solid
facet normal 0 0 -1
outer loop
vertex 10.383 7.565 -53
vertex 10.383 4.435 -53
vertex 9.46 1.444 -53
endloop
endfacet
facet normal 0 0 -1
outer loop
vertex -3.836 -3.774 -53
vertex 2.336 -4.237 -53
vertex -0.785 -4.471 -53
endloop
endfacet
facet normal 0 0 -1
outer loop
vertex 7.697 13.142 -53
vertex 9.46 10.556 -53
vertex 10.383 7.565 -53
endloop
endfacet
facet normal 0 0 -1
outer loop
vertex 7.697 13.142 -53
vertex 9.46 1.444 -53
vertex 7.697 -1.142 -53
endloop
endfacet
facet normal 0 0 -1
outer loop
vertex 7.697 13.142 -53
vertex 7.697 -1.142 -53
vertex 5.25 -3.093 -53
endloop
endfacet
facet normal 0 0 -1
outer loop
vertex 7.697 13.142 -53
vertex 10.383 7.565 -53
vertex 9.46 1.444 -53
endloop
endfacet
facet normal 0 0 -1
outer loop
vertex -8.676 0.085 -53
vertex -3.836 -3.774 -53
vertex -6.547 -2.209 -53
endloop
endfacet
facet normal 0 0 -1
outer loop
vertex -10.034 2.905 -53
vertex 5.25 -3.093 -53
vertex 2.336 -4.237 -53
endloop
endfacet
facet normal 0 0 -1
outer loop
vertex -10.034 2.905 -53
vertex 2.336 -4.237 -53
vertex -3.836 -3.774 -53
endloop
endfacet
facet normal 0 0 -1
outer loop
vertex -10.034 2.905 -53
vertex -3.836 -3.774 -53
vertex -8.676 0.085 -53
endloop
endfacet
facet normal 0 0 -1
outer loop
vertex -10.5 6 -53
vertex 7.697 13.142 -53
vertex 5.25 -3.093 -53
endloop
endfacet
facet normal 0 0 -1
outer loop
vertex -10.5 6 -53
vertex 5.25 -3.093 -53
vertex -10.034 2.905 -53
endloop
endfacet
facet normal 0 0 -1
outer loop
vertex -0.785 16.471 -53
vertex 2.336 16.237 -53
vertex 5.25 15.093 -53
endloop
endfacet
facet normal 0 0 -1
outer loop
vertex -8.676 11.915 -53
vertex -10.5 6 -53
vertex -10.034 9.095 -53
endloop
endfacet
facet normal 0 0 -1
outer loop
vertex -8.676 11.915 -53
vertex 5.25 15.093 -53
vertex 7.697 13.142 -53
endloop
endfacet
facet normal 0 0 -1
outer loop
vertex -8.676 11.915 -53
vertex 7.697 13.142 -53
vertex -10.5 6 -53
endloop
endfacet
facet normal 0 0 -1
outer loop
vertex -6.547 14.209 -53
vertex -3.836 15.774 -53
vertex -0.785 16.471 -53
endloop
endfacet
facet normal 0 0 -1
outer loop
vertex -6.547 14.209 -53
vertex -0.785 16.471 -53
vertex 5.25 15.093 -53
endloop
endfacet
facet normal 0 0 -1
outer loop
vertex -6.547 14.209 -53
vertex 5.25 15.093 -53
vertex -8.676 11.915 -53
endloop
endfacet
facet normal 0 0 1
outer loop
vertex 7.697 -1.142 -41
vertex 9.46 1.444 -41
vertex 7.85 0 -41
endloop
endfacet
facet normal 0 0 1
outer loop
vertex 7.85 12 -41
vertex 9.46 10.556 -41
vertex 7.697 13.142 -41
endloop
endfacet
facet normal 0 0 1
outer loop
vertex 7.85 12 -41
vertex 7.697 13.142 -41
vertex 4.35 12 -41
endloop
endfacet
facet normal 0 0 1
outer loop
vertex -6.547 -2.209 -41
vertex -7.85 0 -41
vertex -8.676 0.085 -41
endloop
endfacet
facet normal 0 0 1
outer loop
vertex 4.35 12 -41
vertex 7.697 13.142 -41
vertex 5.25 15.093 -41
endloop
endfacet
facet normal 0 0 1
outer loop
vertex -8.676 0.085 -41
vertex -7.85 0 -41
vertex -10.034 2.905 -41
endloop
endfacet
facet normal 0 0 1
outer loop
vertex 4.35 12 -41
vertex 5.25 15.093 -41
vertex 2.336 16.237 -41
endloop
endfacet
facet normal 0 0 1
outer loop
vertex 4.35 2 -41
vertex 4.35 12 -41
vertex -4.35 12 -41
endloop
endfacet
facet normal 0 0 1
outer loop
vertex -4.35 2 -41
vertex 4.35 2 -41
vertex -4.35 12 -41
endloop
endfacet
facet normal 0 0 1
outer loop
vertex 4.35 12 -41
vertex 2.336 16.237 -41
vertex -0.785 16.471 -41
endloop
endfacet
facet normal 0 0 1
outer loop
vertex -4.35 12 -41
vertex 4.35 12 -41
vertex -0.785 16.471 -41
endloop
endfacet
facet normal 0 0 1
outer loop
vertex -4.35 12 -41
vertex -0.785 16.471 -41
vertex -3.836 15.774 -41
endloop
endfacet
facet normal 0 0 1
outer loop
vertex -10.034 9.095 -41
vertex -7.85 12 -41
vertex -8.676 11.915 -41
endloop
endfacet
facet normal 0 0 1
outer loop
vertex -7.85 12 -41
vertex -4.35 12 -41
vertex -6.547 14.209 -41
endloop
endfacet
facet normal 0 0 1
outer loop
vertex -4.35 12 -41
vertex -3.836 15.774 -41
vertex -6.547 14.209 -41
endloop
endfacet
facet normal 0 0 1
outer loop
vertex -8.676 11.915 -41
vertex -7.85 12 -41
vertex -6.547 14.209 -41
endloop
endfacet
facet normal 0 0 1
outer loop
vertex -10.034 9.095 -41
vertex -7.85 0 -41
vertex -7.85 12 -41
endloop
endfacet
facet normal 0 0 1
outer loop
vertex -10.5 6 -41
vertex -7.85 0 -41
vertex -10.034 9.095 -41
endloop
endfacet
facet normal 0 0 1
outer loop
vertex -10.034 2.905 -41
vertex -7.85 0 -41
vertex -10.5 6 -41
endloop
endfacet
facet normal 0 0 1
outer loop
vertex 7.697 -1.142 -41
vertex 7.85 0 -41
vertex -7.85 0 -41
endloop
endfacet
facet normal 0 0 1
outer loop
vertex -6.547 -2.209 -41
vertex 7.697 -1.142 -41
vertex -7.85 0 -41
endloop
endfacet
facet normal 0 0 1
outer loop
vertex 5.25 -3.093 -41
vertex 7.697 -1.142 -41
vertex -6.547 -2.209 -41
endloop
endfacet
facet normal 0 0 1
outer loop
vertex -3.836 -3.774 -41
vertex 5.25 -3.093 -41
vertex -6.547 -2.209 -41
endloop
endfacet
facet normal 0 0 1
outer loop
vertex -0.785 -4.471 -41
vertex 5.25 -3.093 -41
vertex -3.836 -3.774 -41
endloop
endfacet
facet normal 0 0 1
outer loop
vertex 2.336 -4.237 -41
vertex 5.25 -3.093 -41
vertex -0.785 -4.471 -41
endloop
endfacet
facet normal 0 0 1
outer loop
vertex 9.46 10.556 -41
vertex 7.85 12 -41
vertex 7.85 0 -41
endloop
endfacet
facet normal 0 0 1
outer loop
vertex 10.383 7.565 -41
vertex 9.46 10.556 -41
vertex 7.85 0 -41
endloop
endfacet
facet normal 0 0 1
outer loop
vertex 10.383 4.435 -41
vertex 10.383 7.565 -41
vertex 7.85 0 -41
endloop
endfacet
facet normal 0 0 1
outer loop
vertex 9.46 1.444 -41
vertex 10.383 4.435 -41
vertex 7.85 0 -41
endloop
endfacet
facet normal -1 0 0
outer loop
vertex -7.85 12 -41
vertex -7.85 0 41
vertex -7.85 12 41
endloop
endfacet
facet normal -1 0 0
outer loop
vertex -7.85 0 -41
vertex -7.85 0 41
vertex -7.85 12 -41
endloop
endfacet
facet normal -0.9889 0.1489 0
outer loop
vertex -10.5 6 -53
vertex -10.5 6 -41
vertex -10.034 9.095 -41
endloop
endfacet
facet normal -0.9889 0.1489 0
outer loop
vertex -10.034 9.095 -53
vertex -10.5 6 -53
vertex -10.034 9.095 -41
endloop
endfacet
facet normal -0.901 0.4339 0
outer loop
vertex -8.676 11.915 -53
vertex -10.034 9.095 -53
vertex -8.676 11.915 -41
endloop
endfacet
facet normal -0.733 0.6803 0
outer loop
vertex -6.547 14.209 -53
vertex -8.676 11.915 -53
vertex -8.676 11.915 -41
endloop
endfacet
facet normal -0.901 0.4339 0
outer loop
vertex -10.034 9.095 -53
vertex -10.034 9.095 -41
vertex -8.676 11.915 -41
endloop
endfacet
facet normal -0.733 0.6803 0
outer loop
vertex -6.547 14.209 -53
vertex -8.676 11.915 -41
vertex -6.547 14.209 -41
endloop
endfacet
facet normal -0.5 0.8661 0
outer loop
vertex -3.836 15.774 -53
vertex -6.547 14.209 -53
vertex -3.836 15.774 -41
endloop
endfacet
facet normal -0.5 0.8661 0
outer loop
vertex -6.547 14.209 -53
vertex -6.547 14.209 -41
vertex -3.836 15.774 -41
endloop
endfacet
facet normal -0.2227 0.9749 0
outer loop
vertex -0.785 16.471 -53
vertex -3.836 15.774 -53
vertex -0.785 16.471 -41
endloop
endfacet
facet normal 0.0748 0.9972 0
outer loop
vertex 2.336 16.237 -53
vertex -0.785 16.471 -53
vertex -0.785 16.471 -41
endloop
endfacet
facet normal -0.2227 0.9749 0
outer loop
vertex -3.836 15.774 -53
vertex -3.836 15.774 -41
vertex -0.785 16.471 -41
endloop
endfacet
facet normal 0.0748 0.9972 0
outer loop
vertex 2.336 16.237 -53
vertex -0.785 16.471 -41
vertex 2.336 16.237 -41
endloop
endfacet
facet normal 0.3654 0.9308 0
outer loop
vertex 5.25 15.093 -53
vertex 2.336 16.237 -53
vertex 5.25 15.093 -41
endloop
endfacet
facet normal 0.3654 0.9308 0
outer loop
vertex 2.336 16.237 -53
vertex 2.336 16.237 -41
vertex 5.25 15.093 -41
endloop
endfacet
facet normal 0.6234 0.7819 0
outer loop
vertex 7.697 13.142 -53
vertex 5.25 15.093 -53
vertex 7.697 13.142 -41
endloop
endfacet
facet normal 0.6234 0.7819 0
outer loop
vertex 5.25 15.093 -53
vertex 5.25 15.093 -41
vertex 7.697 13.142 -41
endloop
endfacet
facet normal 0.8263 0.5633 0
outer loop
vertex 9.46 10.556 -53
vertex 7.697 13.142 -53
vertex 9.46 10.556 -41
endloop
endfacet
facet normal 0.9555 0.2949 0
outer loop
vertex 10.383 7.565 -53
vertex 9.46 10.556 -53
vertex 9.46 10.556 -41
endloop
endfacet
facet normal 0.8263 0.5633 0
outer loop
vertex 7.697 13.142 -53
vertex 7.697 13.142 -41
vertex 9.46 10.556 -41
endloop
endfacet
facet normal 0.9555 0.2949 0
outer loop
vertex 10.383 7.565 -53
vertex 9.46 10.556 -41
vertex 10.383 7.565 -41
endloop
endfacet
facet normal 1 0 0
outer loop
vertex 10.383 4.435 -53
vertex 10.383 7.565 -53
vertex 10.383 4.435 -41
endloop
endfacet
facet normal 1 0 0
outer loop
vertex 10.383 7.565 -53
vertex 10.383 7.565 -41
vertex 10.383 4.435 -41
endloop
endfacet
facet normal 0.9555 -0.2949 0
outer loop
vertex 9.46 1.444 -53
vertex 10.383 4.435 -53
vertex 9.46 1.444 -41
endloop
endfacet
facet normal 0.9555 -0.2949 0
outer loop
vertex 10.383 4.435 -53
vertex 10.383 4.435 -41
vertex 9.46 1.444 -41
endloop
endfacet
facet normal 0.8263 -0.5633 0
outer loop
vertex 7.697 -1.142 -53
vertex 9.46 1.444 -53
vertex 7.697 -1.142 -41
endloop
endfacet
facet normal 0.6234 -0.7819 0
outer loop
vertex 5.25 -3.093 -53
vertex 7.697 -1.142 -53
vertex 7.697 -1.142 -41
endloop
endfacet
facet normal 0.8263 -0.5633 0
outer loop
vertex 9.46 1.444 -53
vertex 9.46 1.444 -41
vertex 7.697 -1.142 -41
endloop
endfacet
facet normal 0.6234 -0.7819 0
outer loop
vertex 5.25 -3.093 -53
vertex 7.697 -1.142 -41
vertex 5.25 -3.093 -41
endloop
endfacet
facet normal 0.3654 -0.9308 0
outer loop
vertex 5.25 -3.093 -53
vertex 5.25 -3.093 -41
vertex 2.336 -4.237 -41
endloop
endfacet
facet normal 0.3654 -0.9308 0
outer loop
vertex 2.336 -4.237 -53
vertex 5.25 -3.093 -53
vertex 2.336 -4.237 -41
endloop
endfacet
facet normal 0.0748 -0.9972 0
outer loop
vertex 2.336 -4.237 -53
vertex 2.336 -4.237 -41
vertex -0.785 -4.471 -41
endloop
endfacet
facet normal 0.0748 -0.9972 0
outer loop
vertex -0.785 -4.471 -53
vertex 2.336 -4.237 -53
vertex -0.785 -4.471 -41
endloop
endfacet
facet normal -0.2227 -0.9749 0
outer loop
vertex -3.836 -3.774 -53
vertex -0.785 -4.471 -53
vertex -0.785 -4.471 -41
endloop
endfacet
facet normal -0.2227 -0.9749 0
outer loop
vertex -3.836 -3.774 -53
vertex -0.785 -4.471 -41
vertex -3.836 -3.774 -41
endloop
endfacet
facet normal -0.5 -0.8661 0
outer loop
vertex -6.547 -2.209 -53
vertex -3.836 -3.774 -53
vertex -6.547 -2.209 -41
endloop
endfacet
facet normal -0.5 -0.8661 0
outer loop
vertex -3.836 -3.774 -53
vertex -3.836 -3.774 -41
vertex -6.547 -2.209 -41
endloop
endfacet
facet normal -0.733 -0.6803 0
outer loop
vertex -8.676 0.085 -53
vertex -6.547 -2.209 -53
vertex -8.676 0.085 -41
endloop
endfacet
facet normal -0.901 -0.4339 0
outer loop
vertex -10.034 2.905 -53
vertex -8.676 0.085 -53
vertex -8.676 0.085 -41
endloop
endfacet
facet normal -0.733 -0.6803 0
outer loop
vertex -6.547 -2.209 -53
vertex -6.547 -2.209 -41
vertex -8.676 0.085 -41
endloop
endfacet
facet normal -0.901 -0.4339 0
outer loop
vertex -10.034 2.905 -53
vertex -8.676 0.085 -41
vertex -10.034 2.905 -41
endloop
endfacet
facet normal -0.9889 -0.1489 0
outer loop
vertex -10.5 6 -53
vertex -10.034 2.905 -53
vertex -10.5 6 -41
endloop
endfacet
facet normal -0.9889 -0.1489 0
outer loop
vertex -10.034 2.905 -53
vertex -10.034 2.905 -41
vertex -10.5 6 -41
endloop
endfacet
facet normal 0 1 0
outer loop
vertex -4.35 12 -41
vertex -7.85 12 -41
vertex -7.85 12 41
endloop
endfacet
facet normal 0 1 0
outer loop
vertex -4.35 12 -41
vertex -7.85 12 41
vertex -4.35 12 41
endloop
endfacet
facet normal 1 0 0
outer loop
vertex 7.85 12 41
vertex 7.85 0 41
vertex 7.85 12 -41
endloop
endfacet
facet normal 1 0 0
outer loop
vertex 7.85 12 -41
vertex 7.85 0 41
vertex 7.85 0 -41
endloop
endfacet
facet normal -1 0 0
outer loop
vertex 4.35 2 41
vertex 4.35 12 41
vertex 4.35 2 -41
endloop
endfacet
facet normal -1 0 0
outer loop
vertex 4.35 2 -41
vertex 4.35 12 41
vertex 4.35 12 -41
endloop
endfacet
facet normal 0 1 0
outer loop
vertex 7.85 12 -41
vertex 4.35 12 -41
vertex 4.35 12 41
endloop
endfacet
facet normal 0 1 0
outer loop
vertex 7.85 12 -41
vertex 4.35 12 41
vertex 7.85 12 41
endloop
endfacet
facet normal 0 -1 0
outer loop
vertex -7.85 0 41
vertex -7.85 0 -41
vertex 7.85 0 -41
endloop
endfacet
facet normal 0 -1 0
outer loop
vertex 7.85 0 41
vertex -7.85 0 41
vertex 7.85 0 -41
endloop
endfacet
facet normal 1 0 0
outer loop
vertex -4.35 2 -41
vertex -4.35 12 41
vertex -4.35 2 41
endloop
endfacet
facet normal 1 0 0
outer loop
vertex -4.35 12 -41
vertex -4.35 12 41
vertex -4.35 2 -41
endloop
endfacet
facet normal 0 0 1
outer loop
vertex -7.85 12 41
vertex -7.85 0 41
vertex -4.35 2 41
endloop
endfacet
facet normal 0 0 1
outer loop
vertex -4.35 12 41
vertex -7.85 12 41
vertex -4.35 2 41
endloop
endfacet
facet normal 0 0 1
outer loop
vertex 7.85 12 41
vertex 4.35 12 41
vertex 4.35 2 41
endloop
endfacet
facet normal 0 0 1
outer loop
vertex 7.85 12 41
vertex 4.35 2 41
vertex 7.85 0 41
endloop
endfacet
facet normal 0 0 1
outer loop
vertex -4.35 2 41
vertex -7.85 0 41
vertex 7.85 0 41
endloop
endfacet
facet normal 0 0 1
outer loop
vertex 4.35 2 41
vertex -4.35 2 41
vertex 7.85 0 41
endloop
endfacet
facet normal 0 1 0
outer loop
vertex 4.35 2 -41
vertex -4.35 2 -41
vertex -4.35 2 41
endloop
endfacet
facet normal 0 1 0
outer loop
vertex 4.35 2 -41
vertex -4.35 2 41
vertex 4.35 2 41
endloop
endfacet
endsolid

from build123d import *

# Parameters (mm, degrees)
SKETCH2_W           = 15.7
SKETCH2_H           = 82
BOSS_EXTRUDE1_DEPTH = 12
SKETCH3_W           = 8.7
SKETCH3_H           = 82
CUT_EXTRUDE1_DEPTH  = 10
SKETCH4_R           = 10.5
BOSS_EXTRUDE2_DEPTH = 12


with BuildPart() as part:
    # Sketch2 → Boss-Extrude1 (new body)
    with BuildSketch(Plane(origin=(0, 0, 0), x_dir=(1, 0, 0), z_dir=(0, 1, 0))):
        Rectangle(SKETCH2_W, SKETCH2_H)
    extrude(amount=BOSS_EXTRUDE1_DEPTH)

    # Sketch3 → Cut-Extrude1 (cut)
    with BuildSketch(Plane(origin=(0, 12, 0), x_dir=(1, 0, 0), z_dir=(0, 1, 0))):
        Rectangle(SKETCH3_W, SKETCH3_H)
    extrude(amount=-CUT_EXTRUDE1_DEPTH, mode=Mode.SUBTRACT)

    # Sketch4 → Boss-Extrude2 (add)
    with BuildSketch(Plane(origin=(0, 0, -41), x_dir=(-1, 0, 0), z_dir=(0, 0, -1))):
        with Locations((0, 6)):
            Circle(SKETCH4_R)
    extrude(amount=BOSS_EXTRUDE2_DEPTH)


solid = part.part
